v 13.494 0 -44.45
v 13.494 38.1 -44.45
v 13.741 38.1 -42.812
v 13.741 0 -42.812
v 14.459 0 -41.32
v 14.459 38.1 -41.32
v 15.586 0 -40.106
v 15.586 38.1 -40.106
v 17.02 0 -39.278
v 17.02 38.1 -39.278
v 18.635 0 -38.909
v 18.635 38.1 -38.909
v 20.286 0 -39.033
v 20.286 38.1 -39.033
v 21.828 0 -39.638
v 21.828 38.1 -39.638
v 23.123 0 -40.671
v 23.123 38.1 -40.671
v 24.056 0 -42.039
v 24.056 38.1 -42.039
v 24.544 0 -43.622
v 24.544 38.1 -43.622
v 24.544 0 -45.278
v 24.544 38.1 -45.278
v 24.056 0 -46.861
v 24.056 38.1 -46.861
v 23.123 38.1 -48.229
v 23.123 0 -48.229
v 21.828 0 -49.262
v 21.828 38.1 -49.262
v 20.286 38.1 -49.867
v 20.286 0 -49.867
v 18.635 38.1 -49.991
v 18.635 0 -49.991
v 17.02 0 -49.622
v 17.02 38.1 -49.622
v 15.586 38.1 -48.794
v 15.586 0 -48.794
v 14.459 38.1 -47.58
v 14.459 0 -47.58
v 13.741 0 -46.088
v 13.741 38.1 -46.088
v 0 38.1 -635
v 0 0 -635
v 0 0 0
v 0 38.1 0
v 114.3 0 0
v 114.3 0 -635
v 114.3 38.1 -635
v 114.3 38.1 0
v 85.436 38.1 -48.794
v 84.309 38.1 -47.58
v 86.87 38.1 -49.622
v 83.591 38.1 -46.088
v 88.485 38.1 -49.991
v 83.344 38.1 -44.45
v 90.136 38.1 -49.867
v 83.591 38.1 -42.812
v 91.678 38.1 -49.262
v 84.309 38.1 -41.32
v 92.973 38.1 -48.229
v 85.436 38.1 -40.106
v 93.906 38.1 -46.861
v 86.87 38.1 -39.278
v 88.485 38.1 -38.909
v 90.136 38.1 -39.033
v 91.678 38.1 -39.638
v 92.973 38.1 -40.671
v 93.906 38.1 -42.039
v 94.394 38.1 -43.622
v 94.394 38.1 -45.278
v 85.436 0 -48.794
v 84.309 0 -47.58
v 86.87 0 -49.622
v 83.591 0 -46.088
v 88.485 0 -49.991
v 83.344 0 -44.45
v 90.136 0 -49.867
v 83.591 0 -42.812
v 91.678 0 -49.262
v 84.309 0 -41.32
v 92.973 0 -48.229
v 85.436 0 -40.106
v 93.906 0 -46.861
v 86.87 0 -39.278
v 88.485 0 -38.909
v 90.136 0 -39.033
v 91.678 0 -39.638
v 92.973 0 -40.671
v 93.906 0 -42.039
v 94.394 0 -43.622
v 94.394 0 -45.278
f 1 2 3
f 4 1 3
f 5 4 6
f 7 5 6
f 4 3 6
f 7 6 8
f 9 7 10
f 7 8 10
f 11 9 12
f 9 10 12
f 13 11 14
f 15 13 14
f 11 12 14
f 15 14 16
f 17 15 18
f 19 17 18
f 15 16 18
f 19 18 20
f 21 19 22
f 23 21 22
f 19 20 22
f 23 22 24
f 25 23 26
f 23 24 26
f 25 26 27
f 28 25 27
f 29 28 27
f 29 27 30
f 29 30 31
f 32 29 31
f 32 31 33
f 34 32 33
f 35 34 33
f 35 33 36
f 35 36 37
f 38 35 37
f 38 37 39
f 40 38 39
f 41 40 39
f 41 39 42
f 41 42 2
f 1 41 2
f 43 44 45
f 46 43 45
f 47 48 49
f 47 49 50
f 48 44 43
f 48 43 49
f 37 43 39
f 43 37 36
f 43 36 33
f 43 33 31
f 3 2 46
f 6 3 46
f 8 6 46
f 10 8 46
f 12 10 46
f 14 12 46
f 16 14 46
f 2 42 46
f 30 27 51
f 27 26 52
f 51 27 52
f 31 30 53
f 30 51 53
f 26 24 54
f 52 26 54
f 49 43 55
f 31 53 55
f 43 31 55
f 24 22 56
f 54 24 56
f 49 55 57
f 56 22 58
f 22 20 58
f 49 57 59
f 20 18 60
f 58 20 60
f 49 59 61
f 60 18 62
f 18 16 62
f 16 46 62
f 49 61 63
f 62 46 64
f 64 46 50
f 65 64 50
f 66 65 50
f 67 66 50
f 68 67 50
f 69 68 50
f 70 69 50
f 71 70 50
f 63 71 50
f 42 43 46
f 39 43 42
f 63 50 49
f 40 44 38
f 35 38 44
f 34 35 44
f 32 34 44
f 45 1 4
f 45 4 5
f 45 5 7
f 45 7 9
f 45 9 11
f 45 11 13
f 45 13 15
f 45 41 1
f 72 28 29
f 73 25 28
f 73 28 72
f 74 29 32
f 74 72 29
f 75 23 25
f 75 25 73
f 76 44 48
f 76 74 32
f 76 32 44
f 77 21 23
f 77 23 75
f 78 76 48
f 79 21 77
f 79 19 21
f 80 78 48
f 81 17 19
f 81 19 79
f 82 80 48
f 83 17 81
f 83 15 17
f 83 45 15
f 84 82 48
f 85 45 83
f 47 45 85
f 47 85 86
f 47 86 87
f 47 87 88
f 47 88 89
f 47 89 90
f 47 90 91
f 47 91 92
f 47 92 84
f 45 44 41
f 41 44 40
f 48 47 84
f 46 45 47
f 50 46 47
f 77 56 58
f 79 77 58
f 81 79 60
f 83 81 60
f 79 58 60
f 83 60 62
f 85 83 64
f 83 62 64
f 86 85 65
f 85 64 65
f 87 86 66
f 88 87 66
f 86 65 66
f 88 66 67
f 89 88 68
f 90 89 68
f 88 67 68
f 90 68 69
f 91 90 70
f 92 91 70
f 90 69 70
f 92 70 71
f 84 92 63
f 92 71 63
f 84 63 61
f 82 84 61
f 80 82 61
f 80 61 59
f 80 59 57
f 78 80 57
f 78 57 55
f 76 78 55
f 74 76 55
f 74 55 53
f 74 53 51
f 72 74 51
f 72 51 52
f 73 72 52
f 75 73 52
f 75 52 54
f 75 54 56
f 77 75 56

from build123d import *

# Parameters (mm, degrees)
F0_W     = 114.3
F0_H     = 635
F1_DEPTH = 38.1
F3_D     = 11.1125


with BuildPart() as f1:
    # F0 (on Front) → F1 (new body)
    with BuildSketch(Plane.XZ):
        with Locations((57.15, -317.5)):
            Rectangle(F0_W, F0_H)
    extrude(amount=-F1_DEPTH)

    # F3 (through all)
    with Locations(Plane.XZ):
        with Locations((19.05, -44.45), (88.9, -44.45)):
            Hole(F3_D / 2)


solid = f1.part
